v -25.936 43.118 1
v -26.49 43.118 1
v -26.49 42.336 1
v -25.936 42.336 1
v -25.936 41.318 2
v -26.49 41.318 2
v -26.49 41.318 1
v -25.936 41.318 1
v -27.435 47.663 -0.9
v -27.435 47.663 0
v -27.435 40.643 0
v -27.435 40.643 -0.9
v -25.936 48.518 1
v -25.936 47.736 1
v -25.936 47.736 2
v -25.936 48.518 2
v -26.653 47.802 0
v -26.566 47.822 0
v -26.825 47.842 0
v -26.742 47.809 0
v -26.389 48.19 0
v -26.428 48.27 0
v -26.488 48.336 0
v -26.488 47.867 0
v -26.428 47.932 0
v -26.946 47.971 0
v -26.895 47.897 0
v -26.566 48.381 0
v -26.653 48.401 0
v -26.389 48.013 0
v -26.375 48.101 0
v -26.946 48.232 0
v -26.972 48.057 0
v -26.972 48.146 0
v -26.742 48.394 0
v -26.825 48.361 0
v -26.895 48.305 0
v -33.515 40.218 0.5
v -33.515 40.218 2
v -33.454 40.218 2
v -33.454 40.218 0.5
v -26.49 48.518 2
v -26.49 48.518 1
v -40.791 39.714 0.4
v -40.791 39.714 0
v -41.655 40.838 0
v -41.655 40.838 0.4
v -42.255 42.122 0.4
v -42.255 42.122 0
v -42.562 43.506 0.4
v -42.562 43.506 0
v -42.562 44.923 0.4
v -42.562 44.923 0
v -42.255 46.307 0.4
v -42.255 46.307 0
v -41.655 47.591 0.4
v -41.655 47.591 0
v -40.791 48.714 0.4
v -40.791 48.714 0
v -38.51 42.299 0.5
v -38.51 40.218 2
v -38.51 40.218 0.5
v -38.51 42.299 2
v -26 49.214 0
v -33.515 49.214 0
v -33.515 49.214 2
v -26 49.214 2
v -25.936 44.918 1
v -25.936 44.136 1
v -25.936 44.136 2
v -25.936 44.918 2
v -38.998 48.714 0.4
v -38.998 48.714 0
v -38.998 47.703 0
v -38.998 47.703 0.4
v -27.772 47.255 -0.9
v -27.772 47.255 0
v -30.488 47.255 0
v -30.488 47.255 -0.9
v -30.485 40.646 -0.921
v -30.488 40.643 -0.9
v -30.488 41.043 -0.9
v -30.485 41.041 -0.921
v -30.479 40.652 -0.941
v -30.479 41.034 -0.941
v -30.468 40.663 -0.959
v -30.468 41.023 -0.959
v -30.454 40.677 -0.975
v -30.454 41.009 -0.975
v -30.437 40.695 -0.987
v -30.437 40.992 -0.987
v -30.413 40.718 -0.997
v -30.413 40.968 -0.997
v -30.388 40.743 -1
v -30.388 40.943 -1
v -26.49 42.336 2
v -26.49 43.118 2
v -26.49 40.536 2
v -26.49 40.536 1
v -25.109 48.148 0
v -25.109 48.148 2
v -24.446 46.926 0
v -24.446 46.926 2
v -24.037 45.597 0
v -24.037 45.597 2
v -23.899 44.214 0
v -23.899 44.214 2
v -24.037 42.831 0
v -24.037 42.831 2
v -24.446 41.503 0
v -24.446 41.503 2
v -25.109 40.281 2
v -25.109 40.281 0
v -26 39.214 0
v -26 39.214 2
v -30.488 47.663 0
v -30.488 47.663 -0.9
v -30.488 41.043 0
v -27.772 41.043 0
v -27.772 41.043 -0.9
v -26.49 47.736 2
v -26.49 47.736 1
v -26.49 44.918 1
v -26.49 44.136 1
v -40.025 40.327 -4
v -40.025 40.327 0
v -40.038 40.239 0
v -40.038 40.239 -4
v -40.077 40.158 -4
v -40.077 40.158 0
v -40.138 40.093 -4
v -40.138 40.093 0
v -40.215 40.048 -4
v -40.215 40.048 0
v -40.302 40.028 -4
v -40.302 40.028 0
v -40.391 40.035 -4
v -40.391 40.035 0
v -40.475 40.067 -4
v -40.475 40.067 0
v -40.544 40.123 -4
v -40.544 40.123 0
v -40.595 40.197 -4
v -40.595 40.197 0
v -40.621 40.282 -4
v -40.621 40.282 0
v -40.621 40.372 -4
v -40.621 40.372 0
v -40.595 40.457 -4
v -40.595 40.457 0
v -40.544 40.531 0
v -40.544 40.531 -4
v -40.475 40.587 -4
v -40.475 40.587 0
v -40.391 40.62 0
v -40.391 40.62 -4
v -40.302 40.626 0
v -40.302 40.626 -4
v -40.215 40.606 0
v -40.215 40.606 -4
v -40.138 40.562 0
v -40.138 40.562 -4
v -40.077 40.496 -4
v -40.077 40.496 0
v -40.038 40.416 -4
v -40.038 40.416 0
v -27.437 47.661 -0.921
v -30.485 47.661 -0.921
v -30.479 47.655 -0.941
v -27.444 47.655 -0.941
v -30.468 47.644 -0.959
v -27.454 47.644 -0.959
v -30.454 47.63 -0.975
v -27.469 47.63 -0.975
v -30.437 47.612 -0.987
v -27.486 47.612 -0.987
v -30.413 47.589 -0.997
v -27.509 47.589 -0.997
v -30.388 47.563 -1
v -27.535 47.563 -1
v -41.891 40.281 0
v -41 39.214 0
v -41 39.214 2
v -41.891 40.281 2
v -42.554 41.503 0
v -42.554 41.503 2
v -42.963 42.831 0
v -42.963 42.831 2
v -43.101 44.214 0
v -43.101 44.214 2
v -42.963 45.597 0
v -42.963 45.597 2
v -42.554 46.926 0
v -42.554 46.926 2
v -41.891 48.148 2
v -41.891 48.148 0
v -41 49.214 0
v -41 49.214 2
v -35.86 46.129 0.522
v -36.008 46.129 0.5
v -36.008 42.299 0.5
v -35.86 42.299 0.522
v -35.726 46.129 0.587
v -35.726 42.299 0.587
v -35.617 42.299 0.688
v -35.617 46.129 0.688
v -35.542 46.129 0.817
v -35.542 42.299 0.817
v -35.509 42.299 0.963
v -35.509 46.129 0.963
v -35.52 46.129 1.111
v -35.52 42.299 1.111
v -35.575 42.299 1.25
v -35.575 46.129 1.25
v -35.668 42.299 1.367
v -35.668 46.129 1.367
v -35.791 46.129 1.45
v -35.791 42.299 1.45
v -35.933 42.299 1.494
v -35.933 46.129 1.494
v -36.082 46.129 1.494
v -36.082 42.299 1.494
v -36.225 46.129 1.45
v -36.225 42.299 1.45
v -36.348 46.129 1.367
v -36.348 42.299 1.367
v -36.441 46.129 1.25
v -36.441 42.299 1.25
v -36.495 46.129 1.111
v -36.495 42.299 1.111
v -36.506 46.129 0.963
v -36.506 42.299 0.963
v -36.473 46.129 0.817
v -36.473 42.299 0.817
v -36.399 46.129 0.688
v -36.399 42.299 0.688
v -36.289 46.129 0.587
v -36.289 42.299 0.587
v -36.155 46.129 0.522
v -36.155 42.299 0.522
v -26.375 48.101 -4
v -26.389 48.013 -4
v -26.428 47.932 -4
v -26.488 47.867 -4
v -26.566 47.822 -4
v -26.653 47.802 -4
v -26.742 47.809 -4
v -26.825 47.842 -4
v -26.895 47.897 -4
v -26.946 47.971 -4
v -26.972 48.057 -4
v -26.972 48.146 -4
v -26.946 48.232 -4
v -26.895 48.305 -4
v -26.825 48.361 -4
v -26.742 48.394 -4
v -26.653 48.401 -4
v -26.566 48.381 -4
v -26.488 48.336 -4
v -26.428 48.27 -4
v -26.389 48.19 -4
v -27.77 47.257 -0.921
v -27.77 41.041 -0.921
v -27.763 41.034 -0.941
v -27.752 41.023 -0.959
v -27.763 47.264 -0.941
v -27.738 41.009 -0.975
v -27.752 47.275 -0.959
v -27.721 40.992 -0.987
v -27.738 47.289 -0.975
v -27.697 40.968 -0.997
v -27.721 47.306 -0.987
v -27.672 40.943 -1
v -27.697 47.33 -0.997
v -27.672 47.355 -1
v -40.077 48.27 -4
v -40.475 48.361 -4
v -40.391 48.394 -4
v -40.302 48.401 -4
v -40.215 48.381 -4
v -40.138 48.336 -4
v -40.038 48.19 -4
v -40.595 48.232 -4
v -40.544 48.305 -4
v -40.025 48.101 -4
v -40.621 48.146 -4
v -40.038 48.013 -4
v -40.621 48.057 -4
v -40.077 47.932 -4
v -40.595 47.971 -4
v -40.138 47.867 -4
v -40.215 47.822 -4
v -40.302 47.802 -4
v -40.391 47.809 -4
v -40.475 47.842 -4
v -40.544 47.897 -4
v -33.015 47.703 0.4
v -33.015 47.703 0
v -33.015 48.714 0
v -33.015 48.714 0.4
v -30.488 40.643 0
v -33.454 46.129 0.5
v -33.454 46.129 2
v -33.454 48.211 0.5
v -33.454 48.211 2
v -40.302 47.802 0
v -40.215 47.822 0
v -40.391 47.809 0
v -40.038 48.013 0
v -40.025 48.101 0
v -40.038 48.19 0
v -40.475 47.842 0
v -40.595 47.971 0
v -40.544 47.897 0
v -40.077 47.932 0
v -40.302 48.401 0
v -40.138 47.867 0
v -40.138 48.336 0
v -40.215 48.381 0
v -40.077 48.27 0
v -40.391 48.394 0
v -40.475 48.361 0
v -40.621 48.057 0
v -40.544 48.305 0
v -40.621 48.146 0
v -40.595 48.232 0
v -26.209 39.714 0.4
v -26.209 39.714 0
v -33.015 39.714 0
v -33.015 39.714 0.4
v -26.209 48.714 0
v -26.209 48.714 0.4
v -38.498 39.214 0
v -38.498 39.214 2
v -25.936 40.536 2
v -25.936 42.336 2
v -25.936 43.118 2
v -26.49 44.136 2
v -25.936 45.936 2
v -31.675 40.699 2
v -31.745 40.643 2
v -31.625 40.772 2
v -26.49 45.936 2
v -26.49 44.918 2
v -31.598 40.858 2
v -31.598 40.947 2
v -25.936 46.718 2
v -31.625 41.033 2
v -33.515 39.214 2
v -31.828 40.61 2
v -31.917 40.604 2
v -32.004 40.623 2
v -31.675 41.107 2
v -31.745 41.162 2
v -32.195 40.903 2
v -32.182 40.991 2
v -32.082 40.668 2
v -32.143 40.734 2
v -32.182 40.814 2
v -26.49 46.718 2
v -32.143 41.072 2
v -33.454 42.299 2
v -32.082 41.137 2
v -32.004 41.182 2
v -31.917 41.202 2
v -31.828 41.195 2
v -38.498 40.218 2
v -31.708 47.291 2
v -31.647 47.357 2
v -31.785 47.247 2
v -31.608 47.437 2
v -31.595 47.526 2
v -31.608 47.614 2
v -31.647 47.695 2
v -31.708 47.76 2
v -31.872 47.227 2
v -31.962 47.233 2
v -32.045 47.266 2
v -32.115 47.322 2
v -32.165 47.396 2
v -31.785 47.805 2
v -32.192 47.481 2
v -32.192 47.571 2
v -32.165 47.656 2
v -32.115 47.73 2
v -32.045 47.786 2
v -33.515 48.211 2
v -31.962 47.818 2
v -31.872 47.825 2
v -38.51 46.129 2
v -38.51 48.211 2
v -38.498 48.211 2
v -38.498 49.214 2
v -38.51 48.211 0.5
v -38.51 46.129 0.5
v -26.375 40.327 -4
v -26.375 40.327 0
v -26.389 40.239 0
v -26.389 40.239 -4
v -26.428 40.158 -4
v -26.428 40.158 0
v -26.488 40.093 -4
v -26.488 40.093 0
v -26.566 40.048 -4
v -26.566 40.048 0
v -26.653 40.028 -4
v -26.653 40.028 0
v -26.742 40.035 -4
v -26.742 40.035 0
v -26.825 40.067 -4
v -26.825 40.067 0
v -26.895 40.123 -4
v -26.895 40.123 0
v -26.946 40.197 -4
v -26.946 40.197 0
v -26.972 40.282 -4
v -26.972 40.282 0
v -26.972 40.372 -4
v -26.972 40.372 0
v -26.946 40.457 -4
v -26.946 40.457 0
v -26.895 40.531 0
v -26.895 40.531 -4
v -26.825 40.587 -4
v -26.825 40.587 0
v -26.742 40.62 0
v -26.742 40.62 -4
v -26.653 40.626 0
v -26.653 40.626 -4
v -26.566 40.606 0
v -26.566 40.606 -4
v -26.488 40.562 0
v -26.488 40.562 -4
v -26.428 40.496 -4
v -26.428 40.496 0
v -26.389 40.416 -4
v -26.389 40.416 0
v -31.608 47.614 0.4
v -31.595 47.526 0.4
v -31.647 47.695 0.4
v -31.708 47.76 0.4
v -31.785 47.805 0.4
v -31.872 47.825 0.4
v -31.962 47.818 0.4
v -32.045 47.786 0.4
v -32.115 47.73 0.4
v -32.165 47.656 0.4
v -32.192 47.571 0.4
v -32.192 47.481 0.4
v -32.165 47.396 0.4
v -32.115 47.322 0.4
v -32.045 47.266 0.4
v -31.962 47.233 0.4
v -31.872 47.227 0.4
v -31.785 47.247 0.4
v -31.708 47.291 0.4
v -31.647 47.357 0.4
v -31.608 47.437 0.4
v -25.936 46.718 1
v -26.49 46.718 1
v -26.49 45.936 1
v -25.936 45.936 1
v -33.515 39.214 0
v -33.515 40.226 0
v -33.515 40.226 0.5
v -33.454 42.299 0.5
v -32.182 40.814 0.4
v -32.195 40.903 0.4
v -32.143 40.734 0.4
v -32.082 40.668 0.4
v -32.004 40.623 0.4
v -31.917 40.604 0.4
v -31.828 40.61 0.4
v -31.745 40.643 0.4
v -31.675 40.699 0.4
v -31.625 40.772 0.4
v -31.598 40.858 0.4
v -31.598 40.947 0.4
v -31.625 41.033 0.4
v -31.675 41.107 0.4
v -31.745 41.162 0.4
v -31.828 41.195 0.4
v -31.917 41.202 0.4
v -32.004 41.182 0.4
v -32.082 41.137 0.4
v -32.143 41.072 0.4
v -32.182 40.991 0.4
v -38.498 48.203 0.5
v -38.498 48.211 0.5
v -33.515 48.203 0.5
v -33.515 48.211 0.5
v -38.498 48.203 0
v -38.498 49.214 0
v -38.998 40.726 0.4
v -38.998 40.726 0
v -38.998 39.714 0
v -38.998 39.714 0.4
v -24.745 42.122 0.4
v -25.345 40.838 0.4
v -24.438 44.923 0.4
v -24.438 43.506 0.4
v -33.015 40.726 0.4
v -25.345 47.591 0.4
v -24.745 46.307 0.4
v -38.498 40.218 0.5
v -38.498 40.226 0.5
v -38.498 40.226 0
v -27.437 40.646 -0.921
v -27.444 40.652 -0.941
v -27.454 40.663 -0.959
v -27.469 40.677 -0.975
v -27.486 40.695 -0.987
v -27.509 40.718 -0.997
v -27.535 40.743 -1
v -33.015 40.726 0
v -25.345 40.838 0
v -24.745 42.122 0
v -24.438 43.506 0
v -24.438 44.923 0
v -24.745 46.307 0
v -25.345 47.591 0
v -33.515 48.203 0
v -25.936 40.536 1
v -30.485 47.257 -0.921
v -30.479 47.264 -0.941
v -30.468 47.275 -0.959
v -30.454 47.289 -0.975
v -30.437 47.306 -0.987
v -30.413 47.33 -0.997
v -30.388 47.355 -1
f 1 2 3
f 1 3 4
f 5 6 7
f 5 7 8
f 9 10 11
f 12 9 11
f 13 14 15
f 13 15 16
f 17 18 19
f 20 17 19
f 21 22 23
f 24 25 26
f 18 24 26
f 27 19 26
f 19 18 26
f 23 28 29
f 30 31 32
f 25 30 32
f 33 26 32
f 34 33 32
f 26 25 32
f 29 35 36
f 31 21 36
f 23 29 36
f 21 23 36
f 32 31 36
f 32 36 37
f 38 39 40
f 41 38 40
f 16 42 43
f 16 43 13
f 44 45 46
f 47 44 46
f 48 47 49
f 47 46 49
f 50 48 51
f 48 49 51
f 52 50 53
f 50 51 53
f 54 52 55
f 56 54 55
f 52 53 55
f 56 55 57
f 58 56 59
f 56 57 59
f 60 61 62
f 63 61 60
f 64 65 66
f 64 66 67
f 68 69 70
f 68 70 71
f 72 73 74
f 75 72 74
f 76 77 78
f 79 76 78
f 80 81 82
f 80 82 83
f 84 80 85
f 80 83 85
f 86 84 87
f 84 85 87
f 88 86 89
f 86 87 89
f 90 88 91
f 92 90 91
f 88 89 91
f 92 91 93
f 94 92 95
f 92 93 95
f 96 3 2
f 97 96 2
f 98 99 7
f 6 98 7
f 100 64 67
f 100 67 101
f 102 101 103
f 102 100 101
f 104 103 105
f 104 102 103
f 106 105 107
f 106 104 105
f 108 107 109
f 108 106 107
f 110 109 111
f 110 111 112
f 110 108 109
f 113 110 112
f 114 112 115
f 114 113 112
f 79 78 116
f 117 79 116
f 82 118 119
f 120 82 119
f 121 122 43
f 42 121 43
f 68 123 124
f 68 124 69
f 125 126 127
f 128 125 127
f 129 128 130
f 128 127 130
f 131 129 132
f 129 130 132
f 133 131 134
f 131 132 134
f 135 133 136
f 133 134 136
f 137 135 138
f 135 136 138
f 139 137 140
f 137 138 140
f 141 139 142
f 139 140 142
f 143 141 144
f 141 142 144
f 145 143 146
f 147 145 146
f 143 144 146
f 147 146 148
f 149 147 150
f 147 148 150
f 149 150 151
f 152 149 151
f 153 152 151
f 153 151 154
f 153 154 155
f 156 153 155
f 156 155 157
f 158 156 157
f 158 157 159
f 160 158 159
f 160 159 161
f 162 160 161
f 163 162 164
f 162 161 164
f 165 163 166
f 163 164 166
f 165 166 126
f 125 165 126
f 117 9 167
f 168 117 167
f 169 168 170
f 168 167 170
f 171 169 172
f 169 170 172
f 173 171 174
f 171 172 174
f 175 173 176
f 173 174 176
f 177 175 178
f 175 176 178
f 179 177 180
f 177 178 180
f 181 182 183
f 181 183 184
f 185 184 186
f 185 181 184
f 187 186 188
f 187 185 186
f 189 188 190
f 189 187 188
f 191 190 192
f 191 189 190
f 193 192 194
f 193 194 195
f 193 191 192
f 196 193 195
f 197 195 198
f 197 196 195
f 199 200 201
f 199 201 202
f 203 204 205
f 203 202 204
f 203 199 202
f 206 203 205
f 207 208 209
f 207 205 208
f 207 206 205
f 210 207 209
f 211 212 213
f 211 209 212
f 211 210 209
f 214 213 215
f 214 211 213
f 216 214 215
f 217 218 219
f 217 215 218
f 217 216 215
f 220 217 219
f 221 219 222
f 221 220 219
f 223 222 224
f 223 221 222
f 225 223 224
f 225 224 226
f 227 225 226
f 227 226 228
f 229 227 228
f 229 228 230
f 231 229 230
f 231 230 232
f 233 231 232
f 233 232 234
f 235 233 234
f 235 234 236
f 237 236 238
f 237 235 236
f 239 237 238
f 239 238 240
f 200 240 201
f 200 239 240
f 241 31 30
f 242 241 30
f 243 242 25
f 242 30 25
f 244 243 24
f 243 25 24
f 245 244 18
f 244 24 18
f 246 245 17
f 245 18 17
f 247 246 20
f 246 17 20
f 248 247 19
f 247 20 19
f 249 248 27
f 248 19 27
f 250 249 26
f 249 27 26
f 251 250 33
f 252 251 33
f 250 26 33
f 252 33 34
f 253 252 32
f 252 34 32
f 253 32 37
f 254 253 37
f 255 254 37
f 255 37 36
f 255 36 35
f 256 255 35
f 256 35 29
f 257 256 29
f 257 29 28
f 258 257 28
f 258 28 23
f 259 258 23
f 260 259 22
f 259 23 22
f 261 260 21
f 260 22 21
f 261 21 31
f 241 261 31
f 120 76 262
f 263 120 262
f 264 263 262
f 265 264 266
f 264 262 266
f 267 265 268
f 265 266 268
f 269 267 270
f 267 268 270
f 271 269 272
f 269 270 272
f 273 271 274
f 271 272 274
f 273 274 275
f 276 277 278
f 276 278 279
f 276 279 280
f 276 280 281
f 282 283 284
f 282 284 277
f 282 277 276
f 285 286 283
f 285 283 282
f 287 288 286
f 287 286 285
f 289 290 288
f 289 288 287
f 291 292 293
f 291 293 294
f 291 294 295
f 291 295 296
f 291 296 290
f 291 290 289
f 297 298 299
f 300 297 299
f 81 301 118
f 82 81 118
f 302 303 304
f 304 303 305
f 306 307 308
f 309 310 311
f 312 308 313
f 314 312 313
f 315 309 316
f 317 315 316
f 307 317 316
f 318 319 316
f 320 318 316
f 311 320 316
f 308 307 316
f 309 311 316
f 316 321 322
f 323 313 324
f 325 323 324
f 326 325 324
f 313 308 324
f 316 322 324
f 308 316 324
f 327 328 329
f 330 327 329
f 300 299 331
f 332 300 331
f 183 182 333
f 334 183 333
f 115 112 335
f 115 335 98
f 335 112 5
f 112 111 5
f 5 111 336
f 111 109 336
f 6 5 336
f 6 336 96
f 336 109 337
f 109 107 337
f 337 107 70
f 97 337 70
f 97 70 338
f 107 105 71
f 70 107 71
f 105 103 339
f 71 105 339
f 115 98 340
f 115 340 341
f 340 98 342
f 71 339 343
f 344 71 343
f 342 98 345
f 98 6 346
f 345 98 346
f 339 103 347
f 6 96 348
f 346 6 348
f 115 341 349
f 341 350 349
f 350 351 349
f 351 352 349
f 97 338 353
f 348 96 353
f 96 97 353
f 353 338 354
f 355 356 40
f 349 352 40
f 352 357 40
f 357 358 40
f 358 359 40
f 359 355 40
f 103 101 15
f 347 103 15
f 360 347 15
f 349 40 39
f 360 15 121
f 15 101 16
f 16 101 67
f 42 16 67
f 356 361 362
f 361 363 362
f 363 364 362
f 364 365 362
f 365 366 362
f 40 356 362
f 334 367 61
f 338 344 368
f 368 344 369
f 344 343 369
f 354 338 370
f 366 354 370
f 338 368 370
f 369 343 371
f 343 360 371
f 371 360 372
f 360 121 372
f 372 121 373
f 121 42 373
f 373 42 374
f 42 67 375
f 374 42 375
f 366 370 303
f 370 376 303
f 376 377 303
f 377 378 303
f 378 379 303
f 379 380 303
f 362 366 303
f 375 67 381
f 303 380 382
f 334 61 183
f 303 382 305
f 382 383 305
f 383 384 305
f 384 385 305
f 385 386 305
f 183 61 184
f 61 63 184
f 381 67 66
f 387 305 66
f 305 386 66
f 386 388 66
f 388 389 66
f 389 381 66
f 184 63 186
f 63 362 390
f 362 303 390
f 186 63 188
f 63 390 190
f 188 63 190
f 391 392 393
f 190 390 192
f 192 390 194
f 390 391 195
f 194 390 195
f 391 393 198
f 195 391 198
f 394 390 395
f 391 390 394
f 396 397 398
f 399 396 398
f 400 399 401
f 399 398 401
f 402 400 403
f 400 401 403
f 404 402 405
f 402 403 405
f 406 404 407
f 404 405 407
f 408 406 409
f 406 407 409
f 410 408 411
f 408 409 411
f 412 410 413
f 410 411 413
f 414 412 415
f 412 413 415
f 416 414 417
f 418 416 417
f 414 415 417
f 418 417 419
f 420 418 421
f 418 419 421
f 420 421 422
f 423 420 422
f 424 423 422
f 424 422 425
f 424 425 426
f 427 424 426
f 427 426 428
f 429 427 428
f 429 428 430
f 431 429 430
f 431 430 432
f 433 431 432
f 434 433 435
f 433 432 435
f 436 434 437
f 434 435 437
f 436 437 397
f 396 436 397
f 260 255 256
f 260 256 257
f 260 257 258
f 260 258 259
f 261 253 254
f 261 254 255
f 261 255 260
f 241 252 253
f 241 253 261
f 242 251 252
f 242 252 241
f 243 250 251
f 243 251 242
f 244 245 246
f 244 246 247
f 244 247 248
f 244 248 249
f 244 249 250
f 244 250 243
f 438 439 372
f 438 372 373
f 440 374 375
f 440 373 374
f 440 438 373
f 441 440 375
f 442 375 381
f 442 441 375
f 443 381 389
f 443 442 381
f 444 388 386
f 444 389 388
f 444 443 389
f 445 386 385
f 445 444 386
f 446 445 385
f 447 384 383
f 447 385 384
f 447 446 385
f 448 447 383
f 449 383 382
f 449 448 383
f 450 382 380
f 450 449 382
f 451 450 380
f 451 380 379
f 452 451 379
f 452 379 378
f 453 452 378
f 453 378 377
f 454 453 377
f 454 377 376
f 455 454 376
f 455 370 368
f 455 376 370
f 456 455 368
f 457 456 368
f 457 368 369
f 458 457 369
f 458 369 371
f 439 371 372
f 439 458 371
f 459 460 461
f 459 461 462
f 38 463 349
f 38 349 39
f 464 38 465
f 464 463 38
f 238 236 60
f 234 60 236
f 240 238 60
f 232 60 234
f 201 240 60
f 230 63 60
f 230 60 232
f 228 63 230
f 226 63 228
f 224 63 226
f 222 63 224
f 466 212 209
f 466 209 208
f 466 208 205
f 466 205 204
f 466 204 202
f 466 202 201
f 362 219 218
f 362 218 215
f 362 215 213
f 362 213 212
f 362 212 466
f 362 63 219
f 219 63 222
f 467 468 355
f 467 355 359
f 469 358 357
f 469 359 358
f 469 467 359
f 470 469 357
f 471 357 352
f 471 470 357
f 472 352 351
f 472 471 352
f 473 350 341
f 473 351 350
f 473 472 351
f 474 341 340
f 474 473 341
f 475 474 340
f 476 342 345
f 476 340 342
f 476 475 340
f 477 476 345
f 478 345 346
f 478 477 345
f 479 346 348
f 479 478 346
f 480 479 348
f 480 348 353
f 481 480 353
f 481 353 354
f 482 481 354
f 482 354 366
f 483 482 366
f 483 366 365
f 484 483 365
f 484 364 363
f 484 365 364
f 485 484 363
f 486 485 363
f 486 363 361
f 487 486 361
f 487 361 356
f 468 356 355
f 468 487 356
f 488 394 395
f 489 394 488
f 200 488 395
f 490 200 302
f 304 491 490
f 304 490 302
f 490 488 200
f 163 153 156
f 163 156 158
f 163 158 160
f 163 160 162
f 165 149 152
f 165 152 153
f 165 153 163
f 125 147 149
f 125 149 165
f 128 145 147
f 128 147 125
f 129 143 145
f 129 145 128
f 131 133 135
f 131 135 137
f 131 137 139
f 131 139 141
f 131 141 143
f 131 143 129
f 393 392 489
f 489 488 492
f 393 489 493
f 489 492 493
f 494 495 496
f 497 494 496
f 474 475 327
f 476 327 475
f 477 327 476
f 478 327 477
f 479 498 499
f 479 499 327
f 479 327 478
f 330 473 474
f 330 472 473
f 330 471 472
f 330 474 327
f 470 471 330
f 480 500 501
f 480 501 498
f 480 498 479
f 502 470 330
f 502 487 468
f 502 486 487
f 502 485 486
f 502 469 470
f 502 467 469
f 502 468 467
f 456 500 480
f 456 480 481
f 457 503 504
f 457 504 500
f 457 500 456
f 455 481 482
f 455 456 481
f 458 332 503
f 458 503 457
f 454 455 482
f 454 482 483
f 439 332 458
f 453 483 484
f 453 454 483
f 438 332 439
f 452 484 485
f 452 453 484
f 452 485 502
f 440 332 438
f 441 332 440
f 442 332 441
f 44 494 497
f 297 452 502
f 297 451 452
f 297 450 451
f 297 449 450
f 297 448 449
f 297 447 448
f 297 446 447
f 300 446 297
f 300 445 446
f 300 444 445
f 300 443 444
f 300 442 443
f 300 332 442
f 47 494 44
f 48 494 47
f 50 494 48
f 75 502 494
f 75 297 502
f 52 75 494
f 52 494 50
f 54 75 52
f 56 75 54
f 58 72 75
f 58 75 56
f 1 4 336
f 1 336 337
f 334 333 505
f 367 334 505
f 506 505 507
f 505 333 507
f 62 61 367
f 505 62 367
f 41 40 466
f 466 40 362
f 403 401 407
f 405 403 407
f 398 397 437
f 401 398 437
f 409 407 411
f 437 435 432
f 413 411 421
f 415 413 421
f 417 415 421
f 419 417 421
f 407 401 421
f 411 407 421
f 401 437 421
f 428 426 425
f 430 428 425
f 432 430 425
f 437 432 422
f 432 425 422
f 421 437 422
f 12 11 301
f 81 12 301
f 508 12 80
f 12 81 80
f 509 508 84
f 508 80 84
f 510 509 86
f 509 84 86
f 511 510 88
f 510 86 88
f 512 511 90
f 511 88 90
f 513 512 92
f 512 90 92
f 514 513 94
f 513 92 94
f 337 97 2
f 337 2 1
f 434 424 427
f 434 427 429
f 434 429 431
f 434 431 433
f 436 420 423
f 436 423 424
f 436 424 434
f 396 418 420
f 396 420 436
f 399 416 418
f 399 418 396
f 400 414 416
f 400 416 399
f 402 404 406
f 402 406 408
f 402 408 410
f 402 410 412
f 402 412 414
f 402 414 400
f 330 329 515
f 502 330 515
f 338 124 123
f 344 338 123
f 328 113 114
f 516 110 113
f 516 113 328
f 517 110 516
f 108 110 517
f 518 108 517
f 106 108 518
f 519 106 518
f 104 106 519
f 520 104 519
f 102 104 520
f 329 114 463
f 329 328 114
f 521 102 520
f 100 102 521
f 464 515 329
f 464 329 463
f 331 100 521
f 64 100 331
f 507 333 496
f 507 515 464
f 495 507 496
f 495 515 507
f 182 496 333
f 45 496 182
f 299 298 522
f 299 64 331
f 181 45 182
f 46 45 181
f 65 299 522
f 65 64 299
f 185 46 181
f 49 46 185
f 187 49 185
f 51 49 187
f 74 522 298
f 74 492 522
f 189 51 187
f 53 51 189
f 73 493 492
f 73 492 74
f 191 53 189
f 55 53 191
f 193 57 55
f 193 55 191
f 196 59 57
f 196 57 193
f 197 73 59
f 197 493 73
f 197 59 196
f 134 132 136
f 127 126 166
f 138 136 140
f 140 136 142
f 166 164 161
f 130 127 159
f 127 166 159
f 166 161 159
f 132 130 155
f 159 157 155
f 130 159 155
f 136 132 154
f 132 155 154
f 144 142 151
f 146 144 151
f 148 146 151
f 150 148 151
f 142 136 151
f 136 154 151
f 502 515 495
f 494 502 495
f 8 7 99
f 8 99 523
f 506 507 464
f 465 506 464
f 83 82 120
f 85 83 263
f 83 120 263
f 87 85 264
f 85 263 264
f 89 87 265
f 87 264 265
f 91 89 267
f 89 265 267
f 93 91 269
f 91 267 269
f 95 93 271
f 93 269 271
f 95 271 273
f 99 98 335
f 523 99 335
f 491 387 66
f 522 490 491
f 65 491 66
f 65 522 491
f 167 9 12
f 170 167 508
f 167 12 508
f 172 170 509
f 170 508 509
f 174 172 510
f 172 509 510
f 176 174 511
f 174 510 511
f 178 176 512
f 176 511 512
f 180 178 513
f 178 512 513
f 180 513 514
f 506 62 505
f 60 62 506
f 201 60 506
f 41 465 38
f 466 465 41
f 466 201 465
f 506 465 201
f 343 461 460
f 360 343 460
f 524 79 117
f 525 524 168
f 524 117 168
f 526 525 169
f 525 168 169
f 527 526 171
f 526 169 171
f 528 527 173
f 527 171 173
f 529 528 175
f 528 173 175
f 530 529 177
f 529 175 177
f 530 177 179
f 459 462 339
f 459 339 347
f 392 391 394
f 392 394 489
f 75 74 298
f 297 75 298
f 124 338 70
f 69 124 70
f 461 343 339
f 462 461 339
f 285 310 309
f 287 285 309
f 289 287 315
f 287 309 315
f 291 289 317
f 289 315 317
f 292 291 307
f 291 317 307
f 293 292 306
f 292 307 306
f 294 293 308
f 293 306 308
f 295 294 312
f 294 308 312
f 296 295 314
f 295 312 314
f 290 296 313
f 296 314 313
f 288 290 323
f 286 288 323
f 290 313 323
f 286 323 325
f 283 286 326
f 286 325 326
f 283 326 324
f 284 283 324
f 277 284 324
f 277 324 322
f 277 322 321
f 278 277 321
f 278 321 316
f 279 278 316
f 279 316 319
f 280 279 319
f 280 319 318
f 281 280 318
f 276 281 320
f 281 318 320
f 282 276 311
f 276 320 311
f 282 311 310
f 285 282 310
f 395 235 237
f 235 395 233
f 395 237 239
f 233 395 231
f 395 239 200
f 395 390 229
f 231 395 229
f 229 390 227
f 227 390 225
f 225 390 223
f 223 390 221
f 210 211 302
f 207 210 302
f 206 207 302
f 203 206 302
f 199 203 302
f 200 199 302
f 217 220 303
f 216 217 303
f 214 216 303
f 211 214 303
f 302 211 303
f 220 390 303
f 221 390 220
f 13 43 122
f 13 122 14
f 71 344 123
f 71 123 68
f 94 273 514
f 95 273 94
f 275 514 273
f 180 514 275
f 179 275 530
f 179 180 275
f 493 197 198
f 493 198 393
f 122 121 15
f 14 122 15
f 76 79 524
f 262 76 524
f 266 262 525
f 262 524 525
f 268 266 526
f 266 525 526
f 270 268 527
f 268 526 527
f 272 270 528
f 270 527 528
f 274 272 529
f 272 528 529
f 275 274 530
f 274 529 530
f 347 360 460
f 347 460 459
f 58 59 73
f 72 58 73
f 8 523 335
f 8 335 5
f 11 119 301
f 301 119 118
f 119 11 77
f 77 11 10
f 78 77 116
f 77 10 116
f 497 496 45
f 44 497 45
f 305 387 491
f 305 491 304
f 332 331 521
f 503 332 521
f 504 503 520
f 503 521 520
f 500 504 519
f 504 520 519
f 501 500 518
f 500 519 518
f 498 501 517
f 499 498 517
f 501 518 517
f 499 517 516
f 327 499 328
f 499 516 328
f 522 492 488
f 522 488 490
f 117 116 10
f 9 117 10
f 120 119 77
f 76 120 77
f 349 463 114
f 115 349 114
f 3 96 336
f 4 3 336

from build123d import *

# Parameters (mm, degrees)
SKETCH1_W               = 15
SKETCH1_H               = 10
BOSS_EXTRUDE1_DEPTH     = 2
CUT_EXTRUDE1_DEPTH      = 66.450316178
CUT_EXTRUDE1_DEPTH_BACK = 66.450316178
SKETCH2_W               = 4.982815842
SKETCH2_H               = 1.189314069
SKETCH2_H_2             = 1.18931407
CUT_EXTRUDE2_DEPTH      = 66.450316178
CUT_EXTRUDE2_DEPTH_BACK = 66.450316178
SKETCH3_R               = 0.3
SKETCH4_R               = 0.3
BOSS_EXTRUDE2_DEPTH     = 4
CUT_EXTRUDE3_DEPTH      = 45.209586789
CUT_EXTRUDE3_DEPTH_BACK = 45.209586789
SKETCH5_R               = 0.5
BOSS_EXTRUDE4_DEPTH     = 1
FILLET4_R               = 0.1
CUT_EXTRUDE4_DEPTH      = 0.4
SKETCH9_W               = 5.055486227
SKETCH9_H               = 2.081670799
SKETCH9_H_2             = 2.0816708
CUT_EXTRUDE5_DEPTH      = 1.5
SKETCH10_W              = 0.553722479
SKETCH10_H              = 0.781725852
CUT_EXTRUDE7_DEPTH      = 1


with BuildPart() as part:
    # Sketch1 → Boss-Extrude1 (new body)
    with BuildSketch(Plane.XY):
        with BuildLine():
            Line((-41, 49.214285714), (-41, 39.214285714))
            ThreePointArc((-41, 39.214285714), (-43.101020514, 44.214285714), (-41, 49.214285714))
        make_face()
        with Locations((-33.5, 44.214285714)):
            Rectangle(SKETCH1_W, SKETCH1_H)
        with BuildLine():
            ThreePointArc((-26, 49.214285714), (-23.898979486, 44.214285714), (-26, 39.214285714))
            Line((-26, 39.214285714), (-26, 49.214285714))
        make_face()
    extrude(amount=BOSS_EXTRUDE1_DEPTH)

    # Sketch2 → Cut-Extrude1 (cut, two sides: drawn at the far end of the back side and taken through both)
    with BuildSketch(Plane.XY.offset(2).offset(-CUT_EXTRUDE1_DEPTH_BACK)):
        with Locations((-36.006215856, 39.631325465)):
            Rectangle(SKETCH2_W, SKETCH2_H)
        with Locations((-36.006215856, 48.797245964)):
            Rectangle(SKETCH2_W, SKETCH2_H_2)
    extrude(amount=CUT_EXTRUDE1_DEPTH + CUT_EXTRUDE1_DEPTH_BACK, mode=Mode.SUBTRACT)

    # Sketch3 → Cut-Extrude2 (cut, two sides: drawn at the far end of the back side and taken through both)
    with BuildSketch(Plane.XY.offset(2).offset(-CUT_EXTRUDE2_DEPTH_BACK)):
        with Locations((-31.894880151, 47.525910235)):
            Circle(SKETCH3_R)
        with Locations(Location((-31.894880151, 40.902661194, 0), (0, 0, 180))):
            Circle(SKETCH3_R)
    extrude(amount=CUT_EXTRUDE2_DEPTH + CUT_EXTRUDE2_DEPTH_BACK, mode=Mode.SUBTRACT)

    # Sketch4 → Boss-Extrude2 (add)
    with BuildSketch(Plane(origin=(0, 0, 0), x_dir=(-1, 0, 0), z_dir=(0, 0, -1))):
        with Locations(Location((26.675429713, 48.101362416, 0), (0, 0, 180))):
            Circle(SKETCH4_R)
        with Locations(Location((26.675429713, 40.327209012, 0), (0, 0, 180))):
            Circle(SKETCH4_R)
        with Locations(Location((40.324570287, 40.327209012, 0), (0, 0, 180))):
            Circle(SKETCH4_R)
        with Locations(Location((40.324570287, 48.101362416, 0), (0, 0, 180))):
            Circle(SKETCH4_R)
    extrude(amount=BOSS_EXTRUDE2_DEPTH)

    # Sketch5 → Cut-Extrude3 (cut, two sides: drawn at the far end of the back side and taken through both)
    with BuildSketch(Plane.XZ.offset(-40.225982499).offset(-CUT_EXTRUDE3_DEPTH_BACK)):
        with Locations(Location((-36.007623777, 1, 0), (0, 0, 270))):
            Circle(SKETCH5_R)
    extrude(amount=CUT_EXTRUDE3_DEPTH + CUT_EXTRUDE3_DEPTH_BACK, mode=Mode.SUBTRACT)

    # Sketch6 → Boss-Extrude4 (add)
    with BuildSketch(Plane(origin=(0, 0, 0), x_dir=(-1, 0, 0), z_dir=(0, 0, -1))):
        Polygon((27.771990414, 41.042860475), (27.771990414, 47.255234787), (30.48768547, 47.255234787), (30.48768547, 47.663476527), (27.434747237, 47.663476527), (27.434747237, 40.643391403), (30.48768547, 40.643391403), (30.48768547, 41.042860475), align=None)
    extrude(amount=BOSS_EXTRUDE4_DEPTH)

    # Fillet4
    fillet4_edges = [part.edges().sort_by_distance(p)[0] for p in [
        (-30.48768547, 47.459355657, -1),
        (-28.961216354, 47.663476527, -1),
        (-30.48768547, 40.843125939, -1),
        (-29.129837942, 41.042860475, -1),
        (-27.771990414, 44.149047631, -1),
        (-27.434747237, 44.153433965, -1),
        (-28.961216354, 40.643391403, -1),
        (-29.129837942, 47.255234787, -1),
    ]]
    fillet(fillet4_edges, radius=FILLET4_R)

    # Sketch8 → Cut-Extrude4 (cut)
    with BuildSketch(Plane(origin=(0, 0, 0), x_dir=(-1, 0, 0), z_dir=(0, 0, -1))):
        with BuildLine():
            Line((40.791436274, 48.714285714), (38.997623777, 48.714285714))
            Line((38.997623777, 48.714285714), (38.997623777, 47.702588929))
            Line((38.997623777, 47.702588929), (33.014807935, 47.702588929))
            Line((33.014807935, 47.702588929), (33.014807935, 48.714285714))
            Line((33.014807935, 48.714285714), (26.208563726, 48.714285714))
            ThreePointArc((26.208563726, 48.714285714), (24.398979486, 44.214285714), (26.208563726, 39.714285714))
            Line((26.208563726, 39.714285714), (33.014807935, 39.714285714))
            Line((33.014807935, 39.714285714), (33.014807935, 40.725982499))
            Line((33.014807935, 40.725982499), (38.997623777, 40.725982499))
            Line((38.997623777, 40.725982499), (38.997623777, 39.714285714))
            Line((38.997623777, 39.714285714), (40.791436274, 39.714285714))
            ThreePointArc((40.791436274, 39.714285714), (42.601020514, 44.214285714), (40.791436274, 48.714285714))
        make_face()
    extrude(amount=-CUT_EXTRUDE4_DEPTH, mode=Mode.SUBTRACT)


with BuildPart() as cut_extrude4_piece_1:
    # of the separate pieces the step leaves, piece 1, a body of its own (cut_extrude4_pieces)
    add(part.part.solids().sort_by_distance((-41, 39.214285714, 0))[0])

    # Sketch9 → Cut-Extrude5 (cut)
    with BuildSketch(Plane.XY.offset(2)):
        with Locations((-35.982073043, 47.170126627)):
            Rectangle(SKETCH9_W, SKETCH9_H)
        with Locations((-35.982073043, 41.258444801)):
            Rectangle(SKETCH9_W, SKETCH9_H_2)
    extrude(amount=-CUT_EXTRUDE5_DEPTH, mode=Mode.SUBTRACT)

    # Sketch10 → Cut-Extrude7 (cut)
    with BuildSketch(Plane.XY.offset(2)):
        with Locations((-26.213222197, 46.3271403)):
            Rectangle(SKETCH10_W, SKETCH10_H)
        with Locations((-26.213222197, 48.1271403)):
            Rectangle(SKETCH10_W, SKETCH10_H)
        with Locations((-26.213222197, 44.5271403)):
            Rectangle(SKETCH10_W, SKETCH10_H)
        with Locations((-26.213222197, 42.7271403)):
            Rectangle(SKETCH10_W, SKETCH10_H)
        with Locations((-26.213222197, 40.9271403)):
            Rectangle(SKETCH10_W, SKETCH10_H)
    extrude(amount=-CUT_EXTRUDE7_DEPTH, mode=Mode.SUBTRACT)


with BuildPart() as cut_extrude4_piece_2:
    # of the separate pieces the step leaves, piece 2, a body of its own (cut_extrude4_pieces)
    add(part.part.solids().sort_by_distance((-27.771990414, 41.042860475, -0.9))[0])


with BuildPart() as cut_extrude4_piece_3:
    # of the separate pieces the step leaves, piece 3, a body of its own (cut_extrude4_pieces)
    add(part.part.solids().sort_by_distance((-40.024570287, 40.327209012, 0))[0])


with BuildPart() as cut_extrude4_piece_4:
    # of the separate pieces the step leaves, piece 4, a body of its own (cut_extrude4_pieces)
    add(part.part.solids().sort_by_distance((-40.024570287, 48.101362416, 0))[0])


with BuildPart() as cut_extrude4_piece_5:
    # of the separate pieces the step leaves, piece 5, a body of its own (cut_extrude4_pieces)
    add(part.part.solids().sort_by_distance((-26.375429713, 40.327209012, 0))[0])


with BuildPart() as cut_extrude4_piece_6:
    # of the separate pieces the step leaves, piece 6, a body of its own (cut_extrude4_pieces)
    add(part.part.solids().sort_by_distance((-26.375429713, 48.101362416, 0))[0])


solid = Compound([cut_extrude4_piece_1.part, cut_extrude4_piece_2.part, cut_extrude4_piece_3.part, cut_extrude4_piece_4.part, cut_extrude4_piece_5.part, cut_extrude4_piece_6.part])
